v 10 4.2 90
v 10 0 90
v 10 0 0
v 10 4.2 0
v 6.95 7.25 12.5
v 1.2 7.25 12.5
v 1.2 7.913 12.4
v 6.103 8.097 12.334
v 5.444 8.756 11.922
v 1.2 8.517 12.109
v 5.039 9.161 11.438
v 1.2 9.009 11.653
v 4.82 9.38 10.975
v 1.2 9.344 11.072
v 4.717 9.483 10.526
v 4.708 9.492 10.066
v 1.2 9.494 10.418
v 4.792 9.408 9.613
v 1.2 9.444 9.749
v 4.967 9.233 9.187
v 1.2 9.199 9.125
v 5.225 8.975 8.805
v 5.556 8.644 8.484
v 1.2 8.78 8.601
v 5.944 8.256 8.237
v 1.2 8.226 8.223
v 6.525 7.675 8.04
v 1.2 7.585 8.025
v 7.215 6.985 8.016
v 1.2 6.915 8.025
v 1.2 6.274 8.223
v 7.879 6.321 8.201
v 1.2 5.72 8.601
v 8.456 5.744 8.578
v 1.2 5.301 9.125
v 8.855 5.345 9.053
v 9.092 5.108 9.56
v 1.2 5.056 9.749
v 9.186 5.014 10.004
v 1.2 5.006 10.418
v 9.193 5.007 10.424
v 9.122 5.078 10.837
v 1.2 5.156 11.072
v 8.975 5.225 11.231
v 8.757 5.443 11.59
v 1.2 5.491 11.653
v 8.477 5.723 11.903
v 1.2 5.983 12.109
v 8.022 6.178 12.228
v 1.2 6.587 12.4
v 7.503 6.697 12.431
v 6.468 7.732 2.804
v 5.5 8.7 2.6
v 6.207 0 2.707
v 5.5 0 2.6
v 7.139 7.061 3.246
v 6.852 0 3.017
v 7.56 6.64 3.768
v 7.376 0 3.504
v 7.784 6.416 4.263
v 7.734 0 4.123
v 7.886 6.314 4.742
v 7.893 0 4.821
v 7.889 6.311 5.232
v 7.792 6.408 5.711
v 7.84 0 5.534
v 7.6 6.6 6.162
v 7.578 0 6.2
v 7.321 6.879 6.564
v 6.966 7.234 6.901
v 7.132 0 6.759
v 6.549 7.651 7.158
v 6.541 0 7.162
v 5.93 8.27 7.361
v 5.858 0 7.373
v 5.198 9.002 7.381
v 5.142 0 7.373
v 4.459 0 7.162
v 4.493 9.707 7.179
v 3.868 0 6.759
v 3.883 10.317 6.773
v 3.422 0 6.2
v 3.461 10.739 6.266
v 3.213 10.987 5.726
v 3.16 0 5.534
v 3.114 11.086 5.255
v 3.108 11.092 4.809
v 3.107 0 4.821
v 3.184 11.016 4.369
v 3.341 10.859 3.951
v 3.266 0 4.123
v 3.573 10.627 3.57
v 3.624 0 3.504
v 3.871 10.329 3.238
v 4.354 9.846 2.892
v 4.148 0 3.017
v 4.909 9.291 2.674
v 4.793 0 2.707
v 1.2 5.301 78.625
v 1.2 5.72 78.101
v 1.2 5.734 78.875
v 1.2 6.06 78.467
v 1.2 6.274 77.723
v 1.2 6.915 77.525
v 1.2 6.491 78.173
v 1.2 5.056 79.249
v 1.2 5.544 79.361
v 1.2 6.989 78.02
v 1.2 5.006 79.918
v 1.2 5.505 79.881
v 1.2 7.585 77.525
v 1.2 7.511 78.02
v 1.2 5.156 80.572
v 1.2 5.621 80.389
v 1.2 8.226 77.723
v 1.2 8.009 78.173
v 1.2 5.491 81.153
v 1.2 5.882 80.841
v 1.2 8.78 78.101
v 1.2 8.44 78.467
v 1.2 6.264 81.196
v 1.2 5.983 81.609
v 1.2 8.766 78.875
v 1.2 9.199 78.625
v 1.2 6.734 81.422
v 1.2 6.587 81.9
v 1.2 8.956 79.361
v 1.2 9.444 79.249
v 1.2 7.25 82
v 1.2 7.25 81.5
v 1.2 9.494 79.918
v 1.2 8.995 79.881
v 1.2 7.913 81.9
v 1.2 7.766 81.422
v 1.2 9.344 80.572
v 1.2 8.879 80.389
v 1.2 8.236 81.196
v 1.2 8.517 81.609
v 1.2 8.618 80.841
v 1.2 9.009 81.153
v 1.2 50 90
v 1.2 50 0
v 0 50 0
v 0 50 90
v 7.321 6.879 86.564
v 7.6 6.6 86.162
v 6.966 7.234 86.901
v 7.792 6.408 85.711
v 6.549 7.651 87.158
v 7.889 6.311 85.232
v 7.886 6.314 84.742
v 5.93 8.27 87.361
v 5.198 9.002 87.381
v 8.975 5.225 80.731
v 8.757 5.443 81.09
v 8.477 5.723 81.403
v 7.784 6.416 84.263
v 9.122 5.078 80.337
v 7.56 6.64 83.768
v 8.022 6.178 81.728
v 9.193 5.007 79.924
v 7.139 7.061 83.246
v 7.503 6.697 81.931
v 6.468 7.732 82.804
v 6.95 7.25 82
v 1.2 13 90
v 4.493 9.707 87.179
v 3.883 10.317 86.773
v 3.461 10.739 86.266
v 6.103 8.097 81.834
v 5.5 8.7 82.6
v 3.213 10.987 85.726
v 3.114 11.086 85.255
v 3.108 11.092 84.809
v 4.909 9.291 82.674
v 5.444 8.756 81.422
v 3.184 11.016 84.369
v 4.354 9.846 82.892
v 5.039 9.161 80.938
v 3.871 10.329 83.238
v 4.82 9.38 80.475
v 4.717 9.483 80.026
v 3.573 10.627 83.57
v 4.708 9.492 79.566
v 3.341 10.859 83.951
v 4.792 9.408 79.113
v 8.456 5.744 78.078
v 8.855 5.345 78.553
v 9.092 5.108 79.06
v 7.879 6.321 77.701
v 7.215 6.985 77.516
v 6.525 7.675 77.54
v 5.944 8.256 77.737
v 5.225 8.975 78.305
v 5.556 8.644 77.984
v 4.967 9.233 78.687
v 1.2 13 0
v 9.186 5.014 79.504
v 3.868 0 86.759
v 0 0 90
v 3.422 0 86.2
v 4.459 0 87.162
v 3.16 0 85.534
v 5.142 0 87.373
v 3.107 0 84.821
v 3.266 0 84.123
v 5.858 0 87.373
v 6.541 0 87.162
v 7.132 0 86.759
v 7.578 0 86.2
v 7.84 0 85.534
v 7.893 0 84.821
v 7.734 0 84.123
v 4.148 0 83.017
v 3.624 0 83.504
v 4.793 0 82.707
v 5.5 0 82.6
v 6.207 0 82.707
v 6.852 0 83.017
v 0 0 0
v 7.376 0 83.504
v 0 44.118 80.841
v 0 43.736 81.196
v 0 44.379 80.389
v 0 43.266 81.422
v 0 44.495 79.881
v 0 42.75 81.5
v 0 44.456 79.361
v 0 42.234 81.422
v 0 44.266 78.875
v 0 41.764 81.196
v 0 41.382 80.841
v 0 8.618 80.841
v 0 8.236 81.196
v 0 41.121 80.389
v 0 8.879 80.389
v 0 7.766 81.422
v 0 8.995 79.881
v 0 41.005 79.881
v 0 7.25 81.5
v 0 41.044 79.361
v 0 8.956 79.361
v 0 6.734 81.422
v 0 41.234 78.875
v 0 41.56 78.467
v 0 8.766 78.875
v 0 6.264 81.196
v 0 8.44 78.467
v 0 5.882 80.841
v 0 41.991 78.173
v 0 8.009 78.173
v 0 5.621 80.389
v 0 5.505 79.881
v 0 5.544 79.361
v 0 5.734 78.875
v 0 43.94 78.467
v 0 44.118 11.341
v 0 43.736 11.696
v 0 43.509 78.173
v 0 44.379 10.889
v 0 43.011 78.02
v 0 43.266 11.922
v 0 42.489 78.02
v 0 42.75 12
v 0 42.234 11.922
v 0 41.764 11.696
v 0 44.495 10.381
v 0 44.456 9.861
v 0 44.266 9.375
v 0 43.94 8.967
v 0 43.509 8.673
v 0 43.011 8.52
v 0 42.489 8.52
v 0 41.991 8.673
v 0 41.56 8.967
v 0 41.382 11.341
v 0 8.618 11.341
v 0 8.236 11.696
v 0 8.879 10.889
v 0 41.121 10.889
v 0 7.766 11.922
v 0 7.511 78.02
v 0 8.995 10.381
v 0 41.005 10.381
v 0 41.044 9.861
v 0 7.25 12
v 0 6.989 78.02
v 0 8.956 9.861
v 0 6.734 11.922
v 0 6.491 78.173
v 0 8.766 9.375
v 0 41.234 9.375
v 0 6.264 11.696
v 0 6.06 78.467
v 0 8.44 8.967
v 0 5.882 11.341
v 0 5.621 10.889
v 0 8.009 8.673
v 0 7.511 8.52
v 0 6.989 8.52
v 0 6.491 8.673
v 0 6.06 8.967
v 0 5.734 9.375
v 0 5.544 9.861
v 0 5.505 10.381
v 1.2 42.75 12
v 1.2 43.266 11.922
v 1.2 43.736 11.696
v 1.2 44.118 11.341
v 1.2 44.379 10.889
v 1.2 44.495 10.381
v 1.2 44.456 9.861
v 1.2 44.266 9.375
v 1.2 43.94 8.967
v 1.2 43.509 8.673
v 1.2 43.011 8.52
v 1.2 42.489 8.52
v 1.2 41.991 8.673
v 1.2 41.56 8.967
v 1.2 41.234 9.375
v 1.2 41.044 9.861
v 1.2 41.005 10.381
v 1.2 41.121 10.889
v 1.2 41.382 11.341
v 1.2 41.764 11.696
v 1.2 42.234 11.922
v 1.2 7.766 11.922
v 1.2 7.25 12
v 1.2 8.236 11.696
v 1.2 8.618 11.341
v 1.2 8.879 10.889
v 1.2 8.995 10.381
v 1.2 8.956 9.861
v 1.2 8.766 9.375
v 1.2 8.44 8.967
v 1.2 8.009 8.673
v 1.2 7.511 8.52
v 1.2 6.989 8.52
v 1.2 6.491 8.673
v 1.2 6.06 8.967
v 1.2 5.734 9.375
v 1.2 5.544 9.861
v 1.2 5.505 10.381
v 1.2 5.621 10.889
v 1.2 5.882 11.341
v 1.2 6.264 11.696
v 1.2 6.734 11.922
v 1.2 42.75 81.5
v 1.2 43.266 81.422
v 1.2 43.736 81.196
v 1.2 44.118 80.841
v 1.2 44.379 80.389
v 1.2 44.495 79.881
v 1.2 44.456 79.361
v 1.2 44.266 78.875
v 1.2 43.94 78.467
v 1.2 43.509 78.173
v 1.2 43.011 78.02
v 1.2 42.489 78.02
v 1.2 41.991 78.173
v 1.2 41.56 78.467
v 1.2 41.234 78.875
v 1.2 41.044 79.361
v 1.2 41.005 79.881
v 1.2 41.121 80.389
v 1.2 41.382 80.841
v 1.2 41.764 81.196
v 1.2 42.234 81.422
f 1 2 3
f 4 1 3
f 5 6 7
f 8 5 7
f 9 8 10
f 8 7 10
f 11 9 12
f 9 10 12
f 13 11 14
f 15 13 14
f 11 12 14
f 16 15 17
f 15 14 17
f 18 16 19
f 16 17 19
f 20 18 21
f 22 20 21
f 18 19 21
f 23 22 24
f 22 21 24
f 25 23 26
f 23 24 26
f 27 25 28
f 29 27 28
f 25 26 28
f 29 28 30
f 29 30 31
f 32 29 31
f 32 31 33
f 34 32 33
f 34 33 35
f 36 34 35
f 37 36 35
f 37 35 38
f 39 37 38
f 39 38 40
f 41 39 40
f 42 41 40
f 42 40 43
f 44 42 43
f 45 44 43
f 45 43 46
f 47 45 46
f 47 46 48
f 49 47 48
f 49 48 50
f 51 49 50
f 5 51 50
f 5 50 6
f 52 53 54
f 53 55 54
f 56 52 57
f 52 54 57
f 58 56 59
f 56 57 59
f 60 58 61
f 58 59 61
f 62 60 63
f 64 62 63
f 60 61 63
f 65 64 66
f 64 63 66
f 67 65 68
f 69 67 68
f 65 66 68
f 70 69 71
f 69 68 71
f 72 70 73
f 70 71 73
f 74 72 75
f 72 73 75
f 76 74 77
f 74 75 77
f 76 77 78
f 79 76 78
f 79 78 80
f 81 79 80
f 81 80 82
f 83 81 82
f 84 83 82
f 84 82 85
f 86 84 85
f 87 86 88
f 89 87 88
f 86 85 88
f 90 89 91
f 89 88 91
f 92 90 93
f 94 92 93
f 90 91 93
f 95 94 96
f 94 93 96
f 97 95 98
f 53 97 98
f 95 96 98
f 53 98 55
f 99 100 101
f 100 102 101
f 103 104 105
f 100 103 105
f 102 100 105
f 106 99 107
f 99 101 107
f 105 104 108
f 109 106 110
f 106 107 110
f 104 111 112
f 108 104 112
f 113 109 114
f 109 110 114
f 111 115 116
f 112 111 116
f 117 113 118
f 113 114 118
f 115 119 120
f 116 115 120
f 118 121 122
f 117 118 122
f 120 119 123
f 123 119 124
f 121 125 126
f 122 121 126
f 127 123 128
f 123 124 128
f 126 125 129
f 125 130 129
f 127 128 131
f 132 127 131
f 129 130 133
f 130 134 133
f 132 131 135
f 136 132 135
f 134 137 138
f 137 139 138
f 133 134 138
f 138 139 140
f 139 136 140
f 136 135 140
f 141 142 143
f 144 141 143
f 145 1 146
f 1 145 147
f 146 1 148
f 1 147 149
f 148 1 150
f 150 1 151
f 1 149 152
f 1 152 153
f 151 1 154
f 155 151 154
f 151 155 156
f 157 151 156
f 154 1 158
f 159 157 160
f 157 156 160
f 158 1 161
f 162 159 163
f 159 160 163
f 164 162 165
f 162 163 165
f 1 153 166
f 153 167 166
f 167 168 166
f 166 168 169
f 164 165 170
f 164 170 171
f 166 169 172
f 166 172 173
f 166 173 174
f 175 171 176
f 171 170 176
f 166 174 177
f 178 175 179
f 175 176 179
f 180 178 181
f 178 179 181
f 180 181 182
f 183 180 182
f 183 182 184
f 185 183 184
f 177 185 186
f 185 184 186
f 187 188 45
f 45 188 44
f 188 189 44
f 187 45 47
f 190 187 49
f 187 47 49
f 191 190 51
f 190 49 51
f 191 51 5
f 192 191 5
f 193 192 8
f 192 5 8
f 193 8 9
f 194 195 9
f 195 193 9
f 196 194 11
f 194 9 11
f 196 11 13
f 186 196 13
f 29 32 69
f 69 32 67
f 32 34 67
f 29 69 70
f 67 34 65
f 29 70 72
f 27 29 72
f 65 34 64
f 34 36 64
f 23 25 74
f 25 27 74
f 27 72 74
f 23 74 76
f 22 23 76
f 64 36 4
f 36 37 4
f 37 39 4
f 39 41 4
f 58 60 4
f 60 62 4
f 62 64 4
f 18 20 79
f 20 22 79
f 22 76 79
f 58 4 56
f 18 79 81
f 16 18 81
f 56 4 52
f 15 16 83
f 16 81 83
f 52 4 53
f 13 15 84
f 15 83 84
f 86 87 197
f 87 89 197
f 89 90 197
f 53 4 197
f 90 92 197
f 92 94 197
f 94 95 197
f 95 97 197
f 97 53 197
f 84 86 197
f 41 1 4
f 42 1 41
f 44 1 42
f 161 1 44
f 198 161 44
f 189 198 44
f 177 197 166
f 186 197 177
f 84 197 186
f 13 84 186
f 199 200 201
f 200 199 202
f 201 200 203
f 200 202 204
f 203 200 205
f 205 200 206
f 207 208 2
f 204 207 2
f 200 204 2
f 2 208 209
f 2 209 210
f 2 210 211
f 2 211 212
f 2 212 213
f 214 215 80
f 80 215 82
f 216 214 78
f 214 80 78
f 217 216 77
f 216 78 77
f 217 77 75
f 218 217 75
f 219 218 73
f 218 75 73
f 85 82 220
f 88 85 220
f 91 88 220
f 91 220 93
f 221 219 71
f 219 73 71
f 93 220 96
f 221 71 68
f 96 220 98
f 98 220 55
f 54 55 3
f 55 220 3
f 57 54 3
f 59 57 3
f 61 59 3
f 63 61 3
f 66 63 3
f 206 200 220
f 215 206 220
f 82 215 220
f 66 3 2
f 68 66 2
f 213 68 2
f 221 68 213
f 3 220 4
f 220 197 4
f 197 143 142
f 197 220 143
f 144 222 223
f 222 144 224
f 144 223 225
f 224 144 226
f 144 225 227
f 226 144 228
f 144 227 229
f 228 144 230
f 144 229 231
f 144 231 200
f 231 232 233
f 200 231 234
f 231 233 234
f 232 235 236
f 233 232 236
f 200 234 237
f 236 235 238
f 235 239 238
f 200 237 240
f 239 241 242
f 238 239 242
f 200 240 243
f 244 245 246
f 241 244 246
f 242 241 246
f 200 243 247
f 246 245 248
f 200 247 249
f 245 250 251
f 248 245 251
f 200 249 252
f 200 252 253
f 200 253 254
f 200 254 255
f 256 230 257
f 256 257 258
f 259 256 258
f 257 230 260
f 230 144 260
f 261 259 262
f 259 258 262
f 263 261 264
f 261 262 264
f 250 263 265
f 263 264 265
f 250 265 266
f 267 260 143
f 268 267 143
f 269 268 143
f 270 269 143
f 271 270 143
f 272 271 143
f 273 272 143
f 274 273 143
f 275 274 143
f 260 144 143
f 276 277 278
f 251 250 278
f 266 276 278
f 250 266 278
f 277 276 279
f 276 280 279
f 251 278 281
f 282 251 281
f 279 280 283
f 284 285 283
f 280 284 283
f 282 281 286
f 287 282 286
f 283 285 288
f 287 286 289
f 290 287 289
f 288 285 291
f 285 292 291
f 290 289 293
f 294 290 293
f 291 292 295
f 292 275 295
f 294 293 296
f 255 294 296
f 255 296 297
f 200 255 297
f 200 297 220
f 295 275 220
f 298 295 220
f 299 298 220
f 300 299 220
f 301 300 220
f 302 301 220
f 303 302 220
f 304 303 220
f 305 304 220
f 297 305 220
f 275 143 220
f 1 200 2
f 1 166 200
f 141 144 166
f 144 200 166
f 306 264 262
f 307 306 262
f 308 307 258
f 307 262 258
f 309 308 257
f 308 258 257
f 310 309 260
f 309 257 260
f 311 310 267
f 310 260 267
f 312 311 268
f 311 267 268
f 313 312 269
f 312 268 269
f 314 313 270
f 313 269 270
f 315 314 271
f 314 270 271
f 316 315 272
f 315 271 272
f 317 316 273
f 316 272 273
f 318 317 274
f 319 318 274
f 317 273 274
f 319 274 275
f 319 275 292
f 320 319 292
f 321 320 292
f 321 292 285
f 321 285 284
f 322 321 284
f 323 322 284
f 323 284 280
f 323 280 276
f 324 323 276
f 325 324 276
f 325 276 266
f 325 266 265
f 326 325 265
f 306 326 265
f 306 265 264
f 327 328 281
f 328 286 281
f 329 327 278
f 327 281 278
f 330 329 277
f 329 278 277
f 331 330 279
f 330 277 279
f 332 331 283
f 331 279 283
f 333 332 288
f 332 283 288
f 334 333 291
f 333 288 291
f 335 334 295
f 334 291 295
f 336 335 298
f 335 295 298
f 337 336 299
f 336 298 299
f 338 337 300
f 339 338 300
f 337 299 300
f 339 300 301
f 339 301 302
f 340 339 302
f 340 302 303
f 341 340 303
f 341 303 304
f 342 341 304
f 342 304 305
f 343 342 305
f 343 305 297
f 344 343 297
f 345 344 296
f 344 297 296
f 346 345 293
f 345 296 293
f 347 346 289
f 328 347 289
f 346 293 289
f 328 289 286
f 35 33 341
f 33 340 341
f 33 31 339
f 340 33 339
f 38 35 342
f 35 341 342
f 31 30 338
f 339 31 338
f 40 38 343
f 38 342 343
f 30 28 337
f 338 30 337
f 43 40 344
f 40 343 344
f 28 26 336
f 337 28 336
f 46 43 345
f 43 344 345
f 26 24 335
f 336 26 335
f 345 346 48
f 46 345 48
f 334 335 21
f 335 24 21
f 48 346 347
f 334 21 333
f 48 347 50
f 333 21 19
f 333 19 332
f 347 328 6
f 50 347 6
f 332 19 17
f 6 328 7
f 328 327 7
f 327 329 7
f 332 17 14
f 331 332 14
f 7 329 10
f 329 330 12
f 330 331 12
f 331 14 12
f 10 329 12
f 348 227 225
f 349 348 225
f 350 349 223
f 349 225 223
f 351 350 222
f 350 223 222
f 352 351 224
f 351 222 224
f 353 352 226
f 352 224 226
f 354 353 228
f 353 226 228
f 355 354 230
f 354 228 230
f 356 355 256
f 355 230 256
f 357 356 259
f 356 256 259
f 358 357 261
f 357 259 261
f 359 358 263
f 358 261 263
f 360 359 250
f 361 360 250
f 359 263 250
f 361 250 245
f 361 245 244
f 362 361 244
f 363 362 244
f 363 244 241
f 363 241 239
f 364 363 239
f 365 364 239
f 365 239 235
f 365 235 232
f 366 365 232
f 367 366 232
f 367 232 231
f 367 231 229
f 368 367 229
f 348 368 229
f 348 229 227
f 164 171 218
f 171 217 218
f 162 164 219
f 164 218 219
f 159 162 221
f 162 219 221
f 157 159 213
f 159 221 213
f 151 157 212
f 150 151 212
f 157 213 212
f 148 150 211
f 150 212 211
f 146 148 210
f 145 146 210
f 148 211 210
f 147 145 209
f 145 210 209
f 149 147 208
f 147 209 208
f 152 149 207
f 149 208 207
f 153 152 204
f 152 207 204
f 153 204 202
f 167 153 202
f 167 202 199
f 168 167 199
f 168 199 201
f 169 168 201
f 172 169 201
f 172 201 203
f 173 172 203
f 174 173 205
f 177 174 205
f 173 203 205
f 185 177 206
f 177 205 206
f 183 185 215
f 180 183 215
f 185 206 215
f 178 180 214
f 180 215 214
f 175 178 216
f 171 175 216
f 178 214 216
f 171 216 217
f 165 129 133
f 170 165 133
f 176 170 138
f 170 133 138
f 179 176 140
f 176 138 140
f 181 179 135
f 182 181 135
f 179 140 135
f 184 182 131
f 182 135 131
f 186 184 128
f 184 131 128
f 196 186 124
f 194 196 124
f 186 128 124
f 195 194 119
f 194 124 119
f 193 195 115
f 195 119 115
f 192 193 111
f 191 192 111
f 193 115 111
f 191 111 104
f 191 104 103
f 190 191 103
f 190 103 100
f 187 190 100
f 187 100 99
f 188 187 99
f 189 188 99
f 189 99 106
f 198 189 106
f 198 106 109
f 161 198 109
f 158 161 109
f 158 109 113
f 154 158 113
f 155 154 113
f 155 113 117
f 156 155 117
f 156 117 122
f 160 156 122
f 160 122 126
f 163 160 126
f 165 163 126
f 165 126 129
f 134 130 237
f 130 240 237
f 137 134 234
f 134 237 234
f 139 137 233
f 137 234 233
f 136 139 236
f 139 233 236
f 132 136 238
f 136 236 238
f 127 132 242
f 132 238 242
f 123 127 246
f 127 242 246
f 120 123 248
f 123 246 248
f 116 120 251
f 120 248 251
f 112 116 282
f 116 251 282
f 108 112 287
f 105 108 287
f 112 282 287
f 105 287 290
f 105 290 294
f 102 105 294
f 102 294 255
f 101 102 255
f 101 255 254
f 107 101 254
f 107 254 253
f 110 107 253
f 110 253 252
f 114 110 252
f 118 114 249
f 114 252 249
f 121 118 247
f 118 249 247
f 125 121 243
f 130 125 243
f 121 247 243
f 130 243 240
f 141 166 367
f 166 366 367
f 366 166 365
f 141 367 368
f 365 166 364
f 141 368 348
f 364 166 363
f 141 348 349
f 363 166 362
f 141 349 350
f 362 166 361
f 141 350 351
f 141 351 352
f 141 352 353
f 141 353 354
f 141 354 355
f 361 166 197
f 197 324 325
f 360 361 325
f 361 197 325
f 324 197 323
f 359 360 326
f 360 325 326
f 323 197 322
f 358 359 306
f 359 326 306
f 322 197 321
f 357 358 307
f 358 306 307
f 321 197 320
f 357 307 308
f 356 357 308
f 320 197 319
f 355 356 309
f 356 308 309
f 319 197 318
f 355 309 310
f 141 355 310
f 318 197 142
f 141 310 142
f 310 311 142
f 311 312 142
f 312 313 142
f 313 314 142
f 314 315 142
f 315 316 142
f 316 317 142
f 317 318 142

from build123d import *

# Parameters (mm, degrees)
BOSS_EXTRU_4_DEPTH      = 90
ESQUISSE8_R             = 1.75
ENL_V_MAT_EXTRU_5_DEPTH = 104.440804328
ESQUISSE9_R             = 2.4
ENL_V_MAT_EXTRU_6_DEPTH = 104.440804328
CONG_7_SIZE             = 10
ENL_V_START             = -1.2
ESQUISSE10_R            = 2.25
ESQUISSE10_R_2          = 1.75
ENL_V_MAT_EXTRU_7_DEPTH = 103.240804328


with BuildPart() as part:
    # Esquisse7 → Boss.-Extru.4 (new body)
    with BuildSketch(Plane.XY):
        Polygon((0, 0), (10, 0), (10, 3), (1.2, 3), (1.2, 50), (0, 50), align=None)
    extrude(amount=BOSS_EXTRU_4_DEPTH)

    # Esquisse8 → Enlèv. mat.-Extru.5 (cut, through all)
    with BuildSketch(Plane.ZY):
        with Locations((10.25, 42.75)):
            Circle(ESQUISSE8_R)
        with Locations((10.25, 7.25)):
            Circle(ESQUISSE8_R)
        with Locations((79.75, 7.25)):
            Circle(ESQUISSE8_R)
        with Locations((79.75, 42.75)):
            Circle(ESQUISSE8_R)
    extrude(amount=-ENL_V_MAT_EXTRU_5_DEPTH, mode=Mode.SUBTRACT)

    # Esquisse9 → Enlèv. mat.-Extru.6 (cut, through all)
    with BuildSketch(Plane.XZ):
        with Locations(Location((5.5, 85, 0), (0, 0, 270))):
            Circle(ESQUISSE9_R)
        with Locations(Location((5.5, 5, 0), (0, 0, 270))):
            Circle(ESQUISSE9_R)
    extrude(amount=-ENL_V_MAT_EXTRU_6_DEPTH, mode=Mode.SUBTRACT)

    # Congé7
    # the kernel refuses this chamfer: 10 mm, written as the material it adds along each edge
    with BuildSketch(Plane(origin=(1.2, 3, 0), x_dir=(0.9996219169112968, -0.02749587661058636, 0), z_dir=(0, 0, 1))) as cong_7_piece_1_section:
        Polygon((CONG_7_SIZE * 0.999621916911, CONG_7_SIZE * 0.0274958766106), (-CONG_7_SIZE * 0.0274958766106, CONG_7_SIZE * 0.999621916911), (0, 0), align=None)
    cong_7_piece_1 = extrude(amount=90, mode=Mode.PRIVATE)
    cong_7_piece_1 = split(cong_7_piece_1, bisect_by=Plane(origin=(10, 6.380086708, 44.999999953), z_dir=(-1, 0, 0)), keep=Keep.TOP, mode=Mode.PRIVATE)
    cong_7_piece_1 = cong_7_piece_1 - Plane(origin=(5.5, 6.380086708, 85), x_dir=(0, 0, -1), z_dir=(0, -1, 0)) * Cylinder(2.4, 220, mode=Mode.PRIVATE)
    cong_7_piece_1 = cong_7_piece_1 - Plane(origin=(5.5, 6.380086708, 5), x_dir=(0, 0, -1), z_dir=(0, -1, 0)) * Cylinder(2.4, 220, mode=Mode.PRIVATE)
    cong_7_piece_1 = cong_7_piece_1 - Plane(origin=(4.314878847, 7.25, 79.75), x_dir=(0, 0, 1), z_dir=(-1, 0, 0)) * Cylinder(1.75, 220, mode=Mode.PRIVATE)
    cong_7_piece_1 = cong_7_piece_1 - Plane(origin=(4.314878847, 7.25, 10.25), x_dir=(0, 0, 1), z_dir=(-1, 0, 0)) * Cylinder(1.75, 220, mode=Mode.PRIVATE)
    add(cong_7_piece_1)

    # Esquisse10 → Enlèv. mat.-Extru.7 (cut, through all)
    # profile 1 of 2: a face of its own
    with BuildSketch(Plane.ZY.offset(ENL_V_START)):
        with Locations((10.25, 7.25)):
            Circle(ESQUISSE10_R)
        with Locations((10.25, 7.25)):
            Circle(ESQUISSE10_R_2, mode=Mode.SUBTRACT)
    # profile 2 of 2: a face of its own
    with BuildSketch(Plane.ZY.offset(ENL_V_START)):
        with Locations((79.75, 7.25)):
            Circle(ESQUISSE10_R)
        with Locations((79.75, 7.25)):
            Circle(ESQUISSE10_R_2, mode=Mode.SUBTRACT)
    extrude(amount=-ENL_V_MAT_EXTRU_7_DEPTH, mode=Mode.SUBTRACT)


solid = part.part
